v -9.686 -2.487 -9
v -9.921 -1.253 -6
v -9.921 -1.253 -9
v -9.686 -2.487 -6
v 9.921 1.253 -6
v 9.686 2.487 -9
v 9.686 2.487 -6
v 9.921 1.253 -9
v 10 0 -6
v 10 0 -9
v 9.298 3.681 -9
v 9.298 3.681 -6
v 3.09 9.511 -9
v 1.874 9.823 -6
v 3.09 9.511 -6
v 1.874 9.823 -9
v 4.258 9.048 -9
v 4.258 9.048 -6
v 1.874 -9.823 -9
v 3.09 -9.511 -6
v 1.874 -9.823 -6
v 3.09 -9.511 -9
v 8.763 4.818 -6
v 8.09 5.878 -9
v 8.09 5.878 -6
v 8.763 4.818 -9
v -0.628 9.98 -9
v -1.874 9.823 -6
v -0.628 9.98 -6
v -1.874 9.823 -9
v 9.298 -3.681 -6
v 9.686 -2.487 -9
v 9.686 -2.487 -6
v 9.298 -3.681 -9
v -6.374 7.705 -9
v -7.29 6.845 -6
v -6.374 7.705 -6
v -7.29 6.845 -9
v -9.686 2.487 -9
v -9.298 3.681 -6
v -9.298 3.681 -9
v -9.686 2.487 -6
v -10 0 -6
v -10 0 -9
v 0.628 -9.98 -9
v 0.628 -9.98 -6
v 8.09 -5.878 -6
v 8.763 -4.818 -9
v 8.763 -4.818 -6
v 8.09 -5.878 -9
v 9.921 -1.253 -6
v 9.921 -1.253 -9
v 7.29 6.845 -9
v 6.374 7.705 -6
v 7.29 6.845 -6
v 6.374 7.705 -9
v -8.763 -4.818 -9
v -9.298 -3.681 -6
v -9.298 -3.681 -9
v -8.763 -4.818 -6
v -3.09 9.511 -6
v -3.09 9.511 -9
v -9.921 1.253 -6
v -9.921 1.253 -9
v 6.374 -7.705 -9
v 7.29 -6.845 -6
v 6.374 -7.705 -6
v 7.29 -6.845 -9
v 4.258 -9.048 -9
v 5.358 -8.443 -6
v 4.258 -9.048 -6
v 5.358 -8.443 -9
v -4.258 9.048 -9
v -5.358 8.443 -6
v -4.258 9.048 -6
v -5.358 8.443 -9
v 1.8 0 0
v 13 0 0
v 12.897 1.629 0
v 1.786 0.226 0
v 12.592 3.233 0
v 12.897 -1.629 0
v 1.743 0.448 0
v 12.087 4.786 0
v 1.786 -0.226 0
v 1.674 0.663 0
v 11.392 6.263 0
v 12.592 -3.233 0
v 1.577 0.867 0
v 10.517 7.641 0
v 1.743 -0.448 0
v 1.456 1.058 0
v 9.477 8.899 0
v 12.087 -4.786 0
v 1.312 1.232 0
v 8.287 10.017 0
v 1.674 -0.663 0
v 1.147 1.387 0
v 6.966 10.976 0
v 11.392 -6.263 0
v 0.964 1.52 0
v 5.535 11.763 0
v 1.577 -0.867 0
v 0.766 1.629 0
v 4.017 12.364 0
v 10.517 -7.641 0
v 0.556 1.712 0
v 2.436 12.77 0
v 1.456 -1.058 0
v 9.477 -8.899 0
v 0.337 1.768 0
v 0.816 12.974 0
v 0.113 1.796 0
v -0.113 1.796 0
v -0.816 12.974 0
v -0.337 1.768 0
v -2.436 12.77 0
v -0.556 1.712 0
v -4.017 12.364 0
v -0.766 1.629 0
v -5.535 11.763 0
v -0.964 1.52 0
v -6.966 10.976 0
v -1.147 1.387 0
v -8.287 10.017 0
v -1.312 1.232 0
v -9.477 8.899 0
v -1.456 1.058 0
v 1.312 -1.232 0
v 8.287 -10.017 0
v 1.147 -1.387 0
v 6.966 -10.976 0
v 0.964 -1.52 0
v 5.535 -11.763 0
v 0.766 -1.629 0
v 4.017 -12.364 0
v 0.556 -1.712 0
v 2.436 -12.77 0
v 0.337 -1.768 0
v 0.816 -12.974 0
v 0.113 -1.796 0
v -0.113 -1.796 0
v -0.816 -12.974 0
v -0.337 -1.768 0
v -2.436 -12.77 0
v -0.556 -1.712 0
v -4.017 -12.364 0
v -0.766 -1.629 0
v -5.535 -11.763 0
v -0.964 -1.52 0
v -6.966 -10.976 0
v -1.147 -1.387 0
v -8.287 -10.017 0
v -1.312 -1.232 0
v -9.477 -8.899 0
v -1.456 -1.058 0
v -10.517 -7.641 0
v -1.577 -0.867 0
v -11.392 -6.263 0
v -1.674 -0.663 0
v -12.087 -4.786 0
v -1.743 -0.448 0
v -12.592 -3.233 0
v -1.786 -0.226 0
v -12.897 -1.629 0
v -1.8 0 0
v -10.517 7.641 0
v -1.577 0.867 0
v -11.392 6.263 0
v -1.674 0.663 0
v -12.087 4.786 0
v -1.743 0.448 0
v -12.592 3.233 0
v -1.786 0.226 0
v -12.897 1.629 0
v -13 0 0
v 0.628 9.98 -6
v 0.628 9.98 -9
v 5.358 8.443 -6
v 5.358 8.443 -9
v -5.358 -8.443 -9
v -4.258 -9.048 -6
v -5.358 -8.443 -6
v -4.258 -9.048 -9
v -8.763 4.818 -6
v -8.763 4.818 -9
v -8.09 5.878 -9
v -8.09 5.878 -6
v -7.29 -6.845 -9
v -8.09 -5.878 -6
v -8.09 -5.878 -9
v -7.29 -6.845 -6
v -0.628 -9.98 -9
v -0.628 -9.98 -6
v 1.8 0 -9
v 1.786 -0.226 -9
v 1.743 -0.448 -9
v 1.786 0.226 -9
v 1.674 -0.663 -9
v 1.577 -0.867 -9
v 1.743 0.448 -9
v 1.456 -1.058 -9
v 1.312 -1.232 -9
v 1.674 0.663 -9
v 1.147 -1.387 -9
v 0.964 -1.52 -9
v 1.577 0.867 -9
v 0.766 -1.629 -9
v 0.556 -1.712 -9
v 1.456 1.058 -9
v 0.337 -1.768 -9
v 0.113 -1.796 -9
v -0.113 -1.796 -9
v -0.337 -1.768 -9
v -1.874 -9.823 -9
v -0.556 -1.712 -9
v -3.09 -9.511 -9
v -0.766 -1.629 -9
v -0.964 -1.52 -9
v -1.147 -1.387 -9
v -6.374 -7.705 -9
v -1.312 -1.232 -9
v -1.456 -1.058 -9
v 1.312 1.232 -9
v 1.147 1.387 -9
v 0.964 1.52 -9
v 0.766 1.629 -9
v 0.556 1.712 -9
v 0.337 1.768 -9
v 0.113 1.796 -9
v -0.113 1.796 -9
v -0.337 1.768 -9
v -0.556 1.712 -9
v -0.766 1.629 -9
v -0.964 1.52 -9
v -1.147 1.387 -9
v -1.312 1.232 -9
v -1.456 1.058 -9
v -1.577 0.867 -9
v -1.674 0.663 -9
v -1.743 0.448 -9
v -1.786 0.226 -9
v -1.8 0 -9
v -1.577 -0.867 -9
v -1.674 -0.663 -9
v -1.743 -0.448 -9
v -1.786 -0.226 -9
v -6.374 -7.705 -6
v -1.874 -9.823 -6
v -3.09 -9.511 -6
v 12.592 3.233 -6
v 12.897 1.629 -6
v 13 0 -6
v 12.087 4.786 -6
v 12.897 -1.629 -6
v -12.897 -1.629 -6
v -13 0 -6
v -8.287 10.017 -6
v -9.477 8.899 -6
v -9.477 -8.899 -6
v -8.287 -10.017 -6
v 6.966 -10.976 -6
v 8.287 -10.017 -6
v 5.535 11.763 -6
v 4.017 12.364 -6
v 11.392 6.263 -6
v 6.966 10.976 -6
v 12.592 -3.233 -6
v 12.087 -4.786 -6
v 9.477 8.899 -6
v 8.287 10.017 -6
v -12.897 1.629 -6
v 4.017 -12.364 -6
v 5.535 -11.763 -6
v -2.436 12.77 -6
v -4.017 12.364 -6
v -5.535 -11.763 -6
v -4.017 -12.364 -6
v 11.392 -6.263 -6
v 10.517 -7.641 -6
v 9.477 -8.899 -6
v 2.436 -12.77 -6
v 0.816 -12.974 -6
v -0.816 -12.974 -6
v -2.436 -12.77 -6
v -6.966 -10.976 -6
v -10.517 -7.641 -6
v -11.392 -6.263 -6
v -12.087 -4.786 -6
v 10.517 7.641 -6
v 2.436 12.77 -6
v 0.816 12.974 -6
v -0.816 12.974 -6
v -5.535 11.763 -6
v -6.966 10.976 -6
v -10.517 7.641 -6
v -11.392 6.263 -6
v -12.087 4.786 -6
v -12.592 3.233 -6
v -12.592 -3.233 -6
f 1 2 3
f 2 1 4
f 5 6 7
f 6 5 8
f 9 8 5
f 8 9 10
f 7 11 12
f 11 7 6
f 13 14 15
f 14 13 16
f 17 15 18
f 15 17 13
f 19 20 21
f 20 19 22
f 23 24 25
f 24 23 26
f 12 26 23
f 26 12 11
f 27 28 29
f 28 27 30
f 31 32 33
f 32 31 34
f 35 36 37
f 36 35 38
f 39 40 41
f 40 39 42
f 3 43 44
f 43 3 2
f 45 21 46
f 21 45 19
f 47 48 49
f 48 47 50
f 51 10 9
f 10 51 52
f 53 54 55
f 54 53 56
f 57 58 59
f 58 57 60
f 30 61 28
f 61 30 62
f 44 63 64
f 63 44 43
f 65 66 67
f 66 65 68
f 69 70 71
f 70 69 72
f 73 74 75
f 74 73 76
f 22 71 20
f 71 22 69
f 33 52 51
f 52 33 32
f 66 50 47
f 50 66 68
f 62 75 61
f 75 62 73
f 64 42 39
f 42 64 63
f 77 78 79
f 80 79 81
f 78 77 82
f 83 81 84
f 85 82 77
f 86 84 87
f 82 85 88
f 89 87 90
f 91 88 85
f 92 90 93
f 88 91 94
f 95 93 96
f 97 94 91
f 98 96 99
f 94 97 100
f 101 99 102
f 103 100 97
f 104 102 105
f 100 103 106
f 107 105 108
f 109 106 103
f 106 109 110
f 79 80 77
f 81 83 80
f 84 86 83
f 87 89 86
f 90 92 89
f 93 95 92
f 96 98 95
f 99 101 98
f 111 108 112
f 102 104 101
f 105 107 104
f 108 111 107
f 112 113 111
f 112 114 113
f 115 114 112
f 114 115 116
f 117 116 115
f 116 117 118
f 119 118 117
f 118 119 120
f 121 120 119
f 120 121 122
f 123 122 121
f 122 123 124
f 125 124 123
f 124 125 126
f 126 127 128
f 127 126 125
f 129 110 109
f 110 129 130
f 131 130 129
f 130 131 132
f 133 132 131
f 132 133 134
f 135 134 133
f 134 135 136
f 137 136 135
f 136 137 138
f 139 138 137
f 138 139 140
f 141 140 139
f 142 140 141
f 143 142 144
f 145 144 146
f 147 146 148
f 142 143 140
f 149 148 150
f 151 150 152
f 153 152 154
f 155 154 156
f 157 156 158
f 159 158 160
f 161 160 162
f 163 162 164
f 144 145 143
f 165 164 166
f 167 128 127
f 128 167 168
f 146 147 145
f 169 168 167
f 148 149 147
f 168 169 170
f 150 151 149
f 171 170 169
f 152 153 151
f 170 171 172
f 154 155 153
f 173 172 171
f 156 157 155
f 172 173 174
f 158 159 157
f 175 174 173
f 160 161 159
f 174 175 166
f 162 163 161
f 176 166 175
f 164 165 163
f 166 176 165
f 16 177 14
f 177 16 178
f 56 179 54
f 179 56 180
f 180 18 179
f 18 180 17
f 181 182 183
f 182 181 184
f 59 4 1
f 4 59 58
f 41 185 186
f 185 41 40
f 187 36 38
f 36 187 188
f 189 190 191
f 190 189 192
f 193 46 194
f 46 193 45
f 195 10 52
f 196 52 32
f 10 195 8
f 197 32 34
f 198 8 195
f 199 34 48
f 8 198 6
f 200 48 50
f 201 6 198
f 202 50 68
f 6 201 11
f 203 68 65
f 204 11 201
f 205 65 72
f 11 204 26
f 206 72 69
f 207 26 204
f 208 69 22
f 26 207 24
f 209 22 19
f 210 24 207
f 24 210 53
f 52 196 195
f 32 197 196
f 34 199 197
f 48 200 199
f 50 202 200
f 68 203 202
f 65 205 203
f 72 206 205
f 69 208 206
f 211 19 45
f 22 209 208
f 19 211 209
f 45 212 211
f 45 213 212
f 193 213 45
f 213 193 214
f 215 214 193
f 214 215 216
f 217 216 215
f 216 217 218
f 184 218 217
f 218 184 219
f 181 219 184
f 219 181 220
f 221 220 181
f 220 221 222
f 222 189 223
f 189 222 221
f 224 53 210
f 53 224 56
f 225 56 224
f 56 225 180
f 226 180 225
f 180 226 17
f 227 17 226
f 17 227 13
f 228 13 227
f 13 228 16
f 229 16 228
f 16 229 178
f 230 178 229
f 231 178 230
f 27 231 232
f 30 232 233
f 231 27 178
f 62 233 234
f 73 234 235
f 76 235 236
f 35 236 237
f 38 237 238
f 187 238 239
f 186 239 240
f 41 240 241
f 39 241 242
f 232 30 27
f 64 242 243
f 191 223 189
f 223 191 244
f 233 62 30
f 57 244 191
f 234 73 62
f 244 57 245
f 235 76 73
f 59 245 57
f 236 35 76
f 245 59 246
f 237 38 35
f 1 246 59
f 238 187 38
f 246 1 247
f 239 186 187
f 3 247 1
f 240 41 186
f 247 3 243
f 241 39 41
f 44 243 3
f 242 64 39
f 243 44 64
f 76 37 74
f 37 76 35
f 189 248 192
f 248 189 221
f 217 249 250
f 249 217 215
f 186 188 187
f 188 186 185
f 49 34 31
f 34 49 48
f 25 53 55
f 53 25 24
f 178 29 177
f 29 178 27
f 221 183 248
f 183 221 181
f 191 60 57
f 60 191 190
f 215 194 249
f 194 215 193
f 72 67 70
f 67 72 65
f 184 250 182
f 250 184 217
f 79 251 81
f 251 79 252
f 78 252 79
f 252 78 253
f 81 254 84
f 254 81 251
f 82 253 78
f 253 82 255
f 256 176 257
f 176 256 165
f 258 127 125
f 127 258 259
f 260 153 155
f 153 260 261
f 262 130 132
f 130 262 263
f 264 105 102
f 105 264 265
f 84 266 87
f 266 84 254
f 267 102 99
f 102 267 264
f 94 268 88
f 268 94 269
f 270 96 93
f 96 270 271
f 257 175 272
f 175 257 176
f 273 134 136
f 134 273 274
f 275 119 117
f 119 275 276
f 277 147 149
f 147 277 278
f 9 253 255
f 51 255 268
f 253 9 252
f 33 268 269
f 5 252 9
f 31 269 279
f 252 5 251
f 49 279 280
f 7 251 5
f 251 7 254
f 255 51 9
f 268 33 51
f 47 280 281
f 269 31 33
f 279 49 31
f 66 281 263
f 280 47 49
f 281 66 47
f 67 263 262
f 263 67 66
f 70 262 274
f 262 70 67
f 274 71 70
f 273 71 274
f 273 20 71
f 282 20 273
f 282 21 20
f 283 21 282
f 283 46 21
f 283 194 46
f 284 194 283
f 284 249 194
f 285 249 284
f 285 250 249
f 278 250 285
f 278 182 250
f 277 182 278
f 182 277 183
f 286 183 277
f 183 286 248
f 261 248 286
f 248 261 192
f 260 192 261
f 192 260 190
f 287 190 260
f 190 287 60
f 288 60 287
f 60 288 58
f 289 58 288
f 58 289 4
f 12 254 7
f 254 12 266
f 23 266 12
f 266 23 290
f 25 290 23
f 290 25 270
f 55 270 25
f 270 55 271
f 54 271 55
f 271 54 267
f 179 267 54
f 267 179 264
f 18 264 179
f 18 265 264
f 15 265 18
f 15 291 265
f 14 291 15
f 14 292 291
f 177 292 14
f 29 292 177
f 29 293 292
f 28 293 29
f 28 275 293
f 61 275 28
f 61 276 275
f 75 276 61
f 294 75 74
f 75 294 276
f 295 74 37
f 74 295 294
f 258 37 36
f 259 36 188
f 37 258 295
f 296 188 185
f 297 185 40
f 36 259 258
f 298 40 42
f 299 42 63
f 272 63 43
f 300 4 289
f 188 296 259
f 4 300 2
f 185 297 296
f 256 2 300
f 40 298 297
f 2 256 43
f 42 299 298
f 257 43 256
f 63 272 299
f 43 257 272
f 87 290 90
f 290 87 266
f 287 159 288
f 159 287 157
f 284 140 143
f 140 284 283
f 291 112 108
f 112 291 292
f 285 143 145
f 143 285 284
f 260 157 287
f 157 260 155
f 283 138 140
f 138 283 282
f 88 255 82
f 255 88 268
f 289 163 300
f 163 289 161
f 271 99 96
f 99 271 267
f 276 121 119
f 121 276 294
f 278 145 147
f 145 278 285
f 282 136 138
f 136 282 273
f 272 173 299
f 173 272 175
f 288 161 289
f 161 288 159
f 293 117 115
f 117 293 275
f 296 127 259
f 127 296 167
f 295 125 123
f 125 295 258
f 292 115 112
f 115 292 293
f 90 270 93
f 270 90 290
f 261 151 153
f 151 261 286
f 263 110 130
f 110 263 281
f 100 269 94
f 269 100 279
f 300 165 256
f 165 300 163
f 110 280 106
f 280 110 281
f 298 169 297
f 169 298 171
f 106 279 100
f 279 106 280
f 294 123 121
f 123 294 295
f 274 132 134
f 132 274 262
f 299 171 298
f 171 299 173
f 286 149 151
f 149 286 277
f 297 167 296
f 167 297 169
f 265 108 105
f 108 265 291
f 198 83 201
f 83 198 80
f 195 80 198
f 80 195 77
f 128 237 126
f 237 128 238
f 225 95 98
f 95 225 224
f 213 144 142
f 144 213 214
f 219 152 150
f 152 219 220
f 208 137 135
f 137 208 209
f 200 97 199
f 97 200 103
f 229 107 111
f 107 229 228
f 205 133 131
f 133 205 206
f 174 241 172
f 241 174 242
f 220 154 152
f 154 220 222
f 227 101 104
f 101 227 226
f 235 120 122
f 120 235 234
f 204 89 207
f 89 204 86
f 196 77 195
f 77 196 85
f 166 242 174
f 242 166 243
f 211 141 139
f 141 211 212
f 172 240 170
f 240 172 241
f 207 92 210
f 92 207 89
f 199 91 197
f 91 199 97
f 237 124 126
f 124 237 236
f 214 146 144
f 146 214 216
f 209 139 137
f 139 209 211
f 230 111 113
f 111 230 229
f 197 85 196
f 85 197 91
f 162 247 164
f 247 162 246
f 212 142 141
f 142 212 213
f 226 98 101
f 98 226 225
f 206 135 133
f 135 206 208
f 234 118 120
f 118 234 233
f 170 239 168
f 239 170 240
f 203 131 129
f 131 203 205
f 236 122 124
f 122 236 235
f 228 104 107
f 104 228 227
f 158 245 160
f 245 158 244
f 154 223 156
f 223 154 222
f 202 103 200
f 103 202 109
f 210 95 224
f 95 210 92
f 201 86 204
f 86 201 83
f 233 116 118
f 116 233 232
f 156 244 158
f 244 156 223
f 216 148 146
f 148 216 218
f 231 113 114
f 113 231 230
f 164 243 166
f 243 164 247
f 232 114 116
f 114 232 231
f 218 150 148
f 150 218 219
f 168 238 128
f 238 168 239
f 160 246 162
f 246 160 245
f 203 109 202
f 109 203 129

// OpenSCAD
$fn = 50;


difference() {
	union() {
		translate(v = [0, 0, -9.0000000000]) {
			cylinder(h = 9, r = 10.0000000000);
		}
		translate(v = [0, 0, -6.0000000000]) {
			cylinder(h = 6, r = 13.0000000000);
		}
	}
	union() {
		#translate(v = [0, 0, -9]) {
			cylinder(h = 9, r = 1.8000000000);
		}
	}
}
